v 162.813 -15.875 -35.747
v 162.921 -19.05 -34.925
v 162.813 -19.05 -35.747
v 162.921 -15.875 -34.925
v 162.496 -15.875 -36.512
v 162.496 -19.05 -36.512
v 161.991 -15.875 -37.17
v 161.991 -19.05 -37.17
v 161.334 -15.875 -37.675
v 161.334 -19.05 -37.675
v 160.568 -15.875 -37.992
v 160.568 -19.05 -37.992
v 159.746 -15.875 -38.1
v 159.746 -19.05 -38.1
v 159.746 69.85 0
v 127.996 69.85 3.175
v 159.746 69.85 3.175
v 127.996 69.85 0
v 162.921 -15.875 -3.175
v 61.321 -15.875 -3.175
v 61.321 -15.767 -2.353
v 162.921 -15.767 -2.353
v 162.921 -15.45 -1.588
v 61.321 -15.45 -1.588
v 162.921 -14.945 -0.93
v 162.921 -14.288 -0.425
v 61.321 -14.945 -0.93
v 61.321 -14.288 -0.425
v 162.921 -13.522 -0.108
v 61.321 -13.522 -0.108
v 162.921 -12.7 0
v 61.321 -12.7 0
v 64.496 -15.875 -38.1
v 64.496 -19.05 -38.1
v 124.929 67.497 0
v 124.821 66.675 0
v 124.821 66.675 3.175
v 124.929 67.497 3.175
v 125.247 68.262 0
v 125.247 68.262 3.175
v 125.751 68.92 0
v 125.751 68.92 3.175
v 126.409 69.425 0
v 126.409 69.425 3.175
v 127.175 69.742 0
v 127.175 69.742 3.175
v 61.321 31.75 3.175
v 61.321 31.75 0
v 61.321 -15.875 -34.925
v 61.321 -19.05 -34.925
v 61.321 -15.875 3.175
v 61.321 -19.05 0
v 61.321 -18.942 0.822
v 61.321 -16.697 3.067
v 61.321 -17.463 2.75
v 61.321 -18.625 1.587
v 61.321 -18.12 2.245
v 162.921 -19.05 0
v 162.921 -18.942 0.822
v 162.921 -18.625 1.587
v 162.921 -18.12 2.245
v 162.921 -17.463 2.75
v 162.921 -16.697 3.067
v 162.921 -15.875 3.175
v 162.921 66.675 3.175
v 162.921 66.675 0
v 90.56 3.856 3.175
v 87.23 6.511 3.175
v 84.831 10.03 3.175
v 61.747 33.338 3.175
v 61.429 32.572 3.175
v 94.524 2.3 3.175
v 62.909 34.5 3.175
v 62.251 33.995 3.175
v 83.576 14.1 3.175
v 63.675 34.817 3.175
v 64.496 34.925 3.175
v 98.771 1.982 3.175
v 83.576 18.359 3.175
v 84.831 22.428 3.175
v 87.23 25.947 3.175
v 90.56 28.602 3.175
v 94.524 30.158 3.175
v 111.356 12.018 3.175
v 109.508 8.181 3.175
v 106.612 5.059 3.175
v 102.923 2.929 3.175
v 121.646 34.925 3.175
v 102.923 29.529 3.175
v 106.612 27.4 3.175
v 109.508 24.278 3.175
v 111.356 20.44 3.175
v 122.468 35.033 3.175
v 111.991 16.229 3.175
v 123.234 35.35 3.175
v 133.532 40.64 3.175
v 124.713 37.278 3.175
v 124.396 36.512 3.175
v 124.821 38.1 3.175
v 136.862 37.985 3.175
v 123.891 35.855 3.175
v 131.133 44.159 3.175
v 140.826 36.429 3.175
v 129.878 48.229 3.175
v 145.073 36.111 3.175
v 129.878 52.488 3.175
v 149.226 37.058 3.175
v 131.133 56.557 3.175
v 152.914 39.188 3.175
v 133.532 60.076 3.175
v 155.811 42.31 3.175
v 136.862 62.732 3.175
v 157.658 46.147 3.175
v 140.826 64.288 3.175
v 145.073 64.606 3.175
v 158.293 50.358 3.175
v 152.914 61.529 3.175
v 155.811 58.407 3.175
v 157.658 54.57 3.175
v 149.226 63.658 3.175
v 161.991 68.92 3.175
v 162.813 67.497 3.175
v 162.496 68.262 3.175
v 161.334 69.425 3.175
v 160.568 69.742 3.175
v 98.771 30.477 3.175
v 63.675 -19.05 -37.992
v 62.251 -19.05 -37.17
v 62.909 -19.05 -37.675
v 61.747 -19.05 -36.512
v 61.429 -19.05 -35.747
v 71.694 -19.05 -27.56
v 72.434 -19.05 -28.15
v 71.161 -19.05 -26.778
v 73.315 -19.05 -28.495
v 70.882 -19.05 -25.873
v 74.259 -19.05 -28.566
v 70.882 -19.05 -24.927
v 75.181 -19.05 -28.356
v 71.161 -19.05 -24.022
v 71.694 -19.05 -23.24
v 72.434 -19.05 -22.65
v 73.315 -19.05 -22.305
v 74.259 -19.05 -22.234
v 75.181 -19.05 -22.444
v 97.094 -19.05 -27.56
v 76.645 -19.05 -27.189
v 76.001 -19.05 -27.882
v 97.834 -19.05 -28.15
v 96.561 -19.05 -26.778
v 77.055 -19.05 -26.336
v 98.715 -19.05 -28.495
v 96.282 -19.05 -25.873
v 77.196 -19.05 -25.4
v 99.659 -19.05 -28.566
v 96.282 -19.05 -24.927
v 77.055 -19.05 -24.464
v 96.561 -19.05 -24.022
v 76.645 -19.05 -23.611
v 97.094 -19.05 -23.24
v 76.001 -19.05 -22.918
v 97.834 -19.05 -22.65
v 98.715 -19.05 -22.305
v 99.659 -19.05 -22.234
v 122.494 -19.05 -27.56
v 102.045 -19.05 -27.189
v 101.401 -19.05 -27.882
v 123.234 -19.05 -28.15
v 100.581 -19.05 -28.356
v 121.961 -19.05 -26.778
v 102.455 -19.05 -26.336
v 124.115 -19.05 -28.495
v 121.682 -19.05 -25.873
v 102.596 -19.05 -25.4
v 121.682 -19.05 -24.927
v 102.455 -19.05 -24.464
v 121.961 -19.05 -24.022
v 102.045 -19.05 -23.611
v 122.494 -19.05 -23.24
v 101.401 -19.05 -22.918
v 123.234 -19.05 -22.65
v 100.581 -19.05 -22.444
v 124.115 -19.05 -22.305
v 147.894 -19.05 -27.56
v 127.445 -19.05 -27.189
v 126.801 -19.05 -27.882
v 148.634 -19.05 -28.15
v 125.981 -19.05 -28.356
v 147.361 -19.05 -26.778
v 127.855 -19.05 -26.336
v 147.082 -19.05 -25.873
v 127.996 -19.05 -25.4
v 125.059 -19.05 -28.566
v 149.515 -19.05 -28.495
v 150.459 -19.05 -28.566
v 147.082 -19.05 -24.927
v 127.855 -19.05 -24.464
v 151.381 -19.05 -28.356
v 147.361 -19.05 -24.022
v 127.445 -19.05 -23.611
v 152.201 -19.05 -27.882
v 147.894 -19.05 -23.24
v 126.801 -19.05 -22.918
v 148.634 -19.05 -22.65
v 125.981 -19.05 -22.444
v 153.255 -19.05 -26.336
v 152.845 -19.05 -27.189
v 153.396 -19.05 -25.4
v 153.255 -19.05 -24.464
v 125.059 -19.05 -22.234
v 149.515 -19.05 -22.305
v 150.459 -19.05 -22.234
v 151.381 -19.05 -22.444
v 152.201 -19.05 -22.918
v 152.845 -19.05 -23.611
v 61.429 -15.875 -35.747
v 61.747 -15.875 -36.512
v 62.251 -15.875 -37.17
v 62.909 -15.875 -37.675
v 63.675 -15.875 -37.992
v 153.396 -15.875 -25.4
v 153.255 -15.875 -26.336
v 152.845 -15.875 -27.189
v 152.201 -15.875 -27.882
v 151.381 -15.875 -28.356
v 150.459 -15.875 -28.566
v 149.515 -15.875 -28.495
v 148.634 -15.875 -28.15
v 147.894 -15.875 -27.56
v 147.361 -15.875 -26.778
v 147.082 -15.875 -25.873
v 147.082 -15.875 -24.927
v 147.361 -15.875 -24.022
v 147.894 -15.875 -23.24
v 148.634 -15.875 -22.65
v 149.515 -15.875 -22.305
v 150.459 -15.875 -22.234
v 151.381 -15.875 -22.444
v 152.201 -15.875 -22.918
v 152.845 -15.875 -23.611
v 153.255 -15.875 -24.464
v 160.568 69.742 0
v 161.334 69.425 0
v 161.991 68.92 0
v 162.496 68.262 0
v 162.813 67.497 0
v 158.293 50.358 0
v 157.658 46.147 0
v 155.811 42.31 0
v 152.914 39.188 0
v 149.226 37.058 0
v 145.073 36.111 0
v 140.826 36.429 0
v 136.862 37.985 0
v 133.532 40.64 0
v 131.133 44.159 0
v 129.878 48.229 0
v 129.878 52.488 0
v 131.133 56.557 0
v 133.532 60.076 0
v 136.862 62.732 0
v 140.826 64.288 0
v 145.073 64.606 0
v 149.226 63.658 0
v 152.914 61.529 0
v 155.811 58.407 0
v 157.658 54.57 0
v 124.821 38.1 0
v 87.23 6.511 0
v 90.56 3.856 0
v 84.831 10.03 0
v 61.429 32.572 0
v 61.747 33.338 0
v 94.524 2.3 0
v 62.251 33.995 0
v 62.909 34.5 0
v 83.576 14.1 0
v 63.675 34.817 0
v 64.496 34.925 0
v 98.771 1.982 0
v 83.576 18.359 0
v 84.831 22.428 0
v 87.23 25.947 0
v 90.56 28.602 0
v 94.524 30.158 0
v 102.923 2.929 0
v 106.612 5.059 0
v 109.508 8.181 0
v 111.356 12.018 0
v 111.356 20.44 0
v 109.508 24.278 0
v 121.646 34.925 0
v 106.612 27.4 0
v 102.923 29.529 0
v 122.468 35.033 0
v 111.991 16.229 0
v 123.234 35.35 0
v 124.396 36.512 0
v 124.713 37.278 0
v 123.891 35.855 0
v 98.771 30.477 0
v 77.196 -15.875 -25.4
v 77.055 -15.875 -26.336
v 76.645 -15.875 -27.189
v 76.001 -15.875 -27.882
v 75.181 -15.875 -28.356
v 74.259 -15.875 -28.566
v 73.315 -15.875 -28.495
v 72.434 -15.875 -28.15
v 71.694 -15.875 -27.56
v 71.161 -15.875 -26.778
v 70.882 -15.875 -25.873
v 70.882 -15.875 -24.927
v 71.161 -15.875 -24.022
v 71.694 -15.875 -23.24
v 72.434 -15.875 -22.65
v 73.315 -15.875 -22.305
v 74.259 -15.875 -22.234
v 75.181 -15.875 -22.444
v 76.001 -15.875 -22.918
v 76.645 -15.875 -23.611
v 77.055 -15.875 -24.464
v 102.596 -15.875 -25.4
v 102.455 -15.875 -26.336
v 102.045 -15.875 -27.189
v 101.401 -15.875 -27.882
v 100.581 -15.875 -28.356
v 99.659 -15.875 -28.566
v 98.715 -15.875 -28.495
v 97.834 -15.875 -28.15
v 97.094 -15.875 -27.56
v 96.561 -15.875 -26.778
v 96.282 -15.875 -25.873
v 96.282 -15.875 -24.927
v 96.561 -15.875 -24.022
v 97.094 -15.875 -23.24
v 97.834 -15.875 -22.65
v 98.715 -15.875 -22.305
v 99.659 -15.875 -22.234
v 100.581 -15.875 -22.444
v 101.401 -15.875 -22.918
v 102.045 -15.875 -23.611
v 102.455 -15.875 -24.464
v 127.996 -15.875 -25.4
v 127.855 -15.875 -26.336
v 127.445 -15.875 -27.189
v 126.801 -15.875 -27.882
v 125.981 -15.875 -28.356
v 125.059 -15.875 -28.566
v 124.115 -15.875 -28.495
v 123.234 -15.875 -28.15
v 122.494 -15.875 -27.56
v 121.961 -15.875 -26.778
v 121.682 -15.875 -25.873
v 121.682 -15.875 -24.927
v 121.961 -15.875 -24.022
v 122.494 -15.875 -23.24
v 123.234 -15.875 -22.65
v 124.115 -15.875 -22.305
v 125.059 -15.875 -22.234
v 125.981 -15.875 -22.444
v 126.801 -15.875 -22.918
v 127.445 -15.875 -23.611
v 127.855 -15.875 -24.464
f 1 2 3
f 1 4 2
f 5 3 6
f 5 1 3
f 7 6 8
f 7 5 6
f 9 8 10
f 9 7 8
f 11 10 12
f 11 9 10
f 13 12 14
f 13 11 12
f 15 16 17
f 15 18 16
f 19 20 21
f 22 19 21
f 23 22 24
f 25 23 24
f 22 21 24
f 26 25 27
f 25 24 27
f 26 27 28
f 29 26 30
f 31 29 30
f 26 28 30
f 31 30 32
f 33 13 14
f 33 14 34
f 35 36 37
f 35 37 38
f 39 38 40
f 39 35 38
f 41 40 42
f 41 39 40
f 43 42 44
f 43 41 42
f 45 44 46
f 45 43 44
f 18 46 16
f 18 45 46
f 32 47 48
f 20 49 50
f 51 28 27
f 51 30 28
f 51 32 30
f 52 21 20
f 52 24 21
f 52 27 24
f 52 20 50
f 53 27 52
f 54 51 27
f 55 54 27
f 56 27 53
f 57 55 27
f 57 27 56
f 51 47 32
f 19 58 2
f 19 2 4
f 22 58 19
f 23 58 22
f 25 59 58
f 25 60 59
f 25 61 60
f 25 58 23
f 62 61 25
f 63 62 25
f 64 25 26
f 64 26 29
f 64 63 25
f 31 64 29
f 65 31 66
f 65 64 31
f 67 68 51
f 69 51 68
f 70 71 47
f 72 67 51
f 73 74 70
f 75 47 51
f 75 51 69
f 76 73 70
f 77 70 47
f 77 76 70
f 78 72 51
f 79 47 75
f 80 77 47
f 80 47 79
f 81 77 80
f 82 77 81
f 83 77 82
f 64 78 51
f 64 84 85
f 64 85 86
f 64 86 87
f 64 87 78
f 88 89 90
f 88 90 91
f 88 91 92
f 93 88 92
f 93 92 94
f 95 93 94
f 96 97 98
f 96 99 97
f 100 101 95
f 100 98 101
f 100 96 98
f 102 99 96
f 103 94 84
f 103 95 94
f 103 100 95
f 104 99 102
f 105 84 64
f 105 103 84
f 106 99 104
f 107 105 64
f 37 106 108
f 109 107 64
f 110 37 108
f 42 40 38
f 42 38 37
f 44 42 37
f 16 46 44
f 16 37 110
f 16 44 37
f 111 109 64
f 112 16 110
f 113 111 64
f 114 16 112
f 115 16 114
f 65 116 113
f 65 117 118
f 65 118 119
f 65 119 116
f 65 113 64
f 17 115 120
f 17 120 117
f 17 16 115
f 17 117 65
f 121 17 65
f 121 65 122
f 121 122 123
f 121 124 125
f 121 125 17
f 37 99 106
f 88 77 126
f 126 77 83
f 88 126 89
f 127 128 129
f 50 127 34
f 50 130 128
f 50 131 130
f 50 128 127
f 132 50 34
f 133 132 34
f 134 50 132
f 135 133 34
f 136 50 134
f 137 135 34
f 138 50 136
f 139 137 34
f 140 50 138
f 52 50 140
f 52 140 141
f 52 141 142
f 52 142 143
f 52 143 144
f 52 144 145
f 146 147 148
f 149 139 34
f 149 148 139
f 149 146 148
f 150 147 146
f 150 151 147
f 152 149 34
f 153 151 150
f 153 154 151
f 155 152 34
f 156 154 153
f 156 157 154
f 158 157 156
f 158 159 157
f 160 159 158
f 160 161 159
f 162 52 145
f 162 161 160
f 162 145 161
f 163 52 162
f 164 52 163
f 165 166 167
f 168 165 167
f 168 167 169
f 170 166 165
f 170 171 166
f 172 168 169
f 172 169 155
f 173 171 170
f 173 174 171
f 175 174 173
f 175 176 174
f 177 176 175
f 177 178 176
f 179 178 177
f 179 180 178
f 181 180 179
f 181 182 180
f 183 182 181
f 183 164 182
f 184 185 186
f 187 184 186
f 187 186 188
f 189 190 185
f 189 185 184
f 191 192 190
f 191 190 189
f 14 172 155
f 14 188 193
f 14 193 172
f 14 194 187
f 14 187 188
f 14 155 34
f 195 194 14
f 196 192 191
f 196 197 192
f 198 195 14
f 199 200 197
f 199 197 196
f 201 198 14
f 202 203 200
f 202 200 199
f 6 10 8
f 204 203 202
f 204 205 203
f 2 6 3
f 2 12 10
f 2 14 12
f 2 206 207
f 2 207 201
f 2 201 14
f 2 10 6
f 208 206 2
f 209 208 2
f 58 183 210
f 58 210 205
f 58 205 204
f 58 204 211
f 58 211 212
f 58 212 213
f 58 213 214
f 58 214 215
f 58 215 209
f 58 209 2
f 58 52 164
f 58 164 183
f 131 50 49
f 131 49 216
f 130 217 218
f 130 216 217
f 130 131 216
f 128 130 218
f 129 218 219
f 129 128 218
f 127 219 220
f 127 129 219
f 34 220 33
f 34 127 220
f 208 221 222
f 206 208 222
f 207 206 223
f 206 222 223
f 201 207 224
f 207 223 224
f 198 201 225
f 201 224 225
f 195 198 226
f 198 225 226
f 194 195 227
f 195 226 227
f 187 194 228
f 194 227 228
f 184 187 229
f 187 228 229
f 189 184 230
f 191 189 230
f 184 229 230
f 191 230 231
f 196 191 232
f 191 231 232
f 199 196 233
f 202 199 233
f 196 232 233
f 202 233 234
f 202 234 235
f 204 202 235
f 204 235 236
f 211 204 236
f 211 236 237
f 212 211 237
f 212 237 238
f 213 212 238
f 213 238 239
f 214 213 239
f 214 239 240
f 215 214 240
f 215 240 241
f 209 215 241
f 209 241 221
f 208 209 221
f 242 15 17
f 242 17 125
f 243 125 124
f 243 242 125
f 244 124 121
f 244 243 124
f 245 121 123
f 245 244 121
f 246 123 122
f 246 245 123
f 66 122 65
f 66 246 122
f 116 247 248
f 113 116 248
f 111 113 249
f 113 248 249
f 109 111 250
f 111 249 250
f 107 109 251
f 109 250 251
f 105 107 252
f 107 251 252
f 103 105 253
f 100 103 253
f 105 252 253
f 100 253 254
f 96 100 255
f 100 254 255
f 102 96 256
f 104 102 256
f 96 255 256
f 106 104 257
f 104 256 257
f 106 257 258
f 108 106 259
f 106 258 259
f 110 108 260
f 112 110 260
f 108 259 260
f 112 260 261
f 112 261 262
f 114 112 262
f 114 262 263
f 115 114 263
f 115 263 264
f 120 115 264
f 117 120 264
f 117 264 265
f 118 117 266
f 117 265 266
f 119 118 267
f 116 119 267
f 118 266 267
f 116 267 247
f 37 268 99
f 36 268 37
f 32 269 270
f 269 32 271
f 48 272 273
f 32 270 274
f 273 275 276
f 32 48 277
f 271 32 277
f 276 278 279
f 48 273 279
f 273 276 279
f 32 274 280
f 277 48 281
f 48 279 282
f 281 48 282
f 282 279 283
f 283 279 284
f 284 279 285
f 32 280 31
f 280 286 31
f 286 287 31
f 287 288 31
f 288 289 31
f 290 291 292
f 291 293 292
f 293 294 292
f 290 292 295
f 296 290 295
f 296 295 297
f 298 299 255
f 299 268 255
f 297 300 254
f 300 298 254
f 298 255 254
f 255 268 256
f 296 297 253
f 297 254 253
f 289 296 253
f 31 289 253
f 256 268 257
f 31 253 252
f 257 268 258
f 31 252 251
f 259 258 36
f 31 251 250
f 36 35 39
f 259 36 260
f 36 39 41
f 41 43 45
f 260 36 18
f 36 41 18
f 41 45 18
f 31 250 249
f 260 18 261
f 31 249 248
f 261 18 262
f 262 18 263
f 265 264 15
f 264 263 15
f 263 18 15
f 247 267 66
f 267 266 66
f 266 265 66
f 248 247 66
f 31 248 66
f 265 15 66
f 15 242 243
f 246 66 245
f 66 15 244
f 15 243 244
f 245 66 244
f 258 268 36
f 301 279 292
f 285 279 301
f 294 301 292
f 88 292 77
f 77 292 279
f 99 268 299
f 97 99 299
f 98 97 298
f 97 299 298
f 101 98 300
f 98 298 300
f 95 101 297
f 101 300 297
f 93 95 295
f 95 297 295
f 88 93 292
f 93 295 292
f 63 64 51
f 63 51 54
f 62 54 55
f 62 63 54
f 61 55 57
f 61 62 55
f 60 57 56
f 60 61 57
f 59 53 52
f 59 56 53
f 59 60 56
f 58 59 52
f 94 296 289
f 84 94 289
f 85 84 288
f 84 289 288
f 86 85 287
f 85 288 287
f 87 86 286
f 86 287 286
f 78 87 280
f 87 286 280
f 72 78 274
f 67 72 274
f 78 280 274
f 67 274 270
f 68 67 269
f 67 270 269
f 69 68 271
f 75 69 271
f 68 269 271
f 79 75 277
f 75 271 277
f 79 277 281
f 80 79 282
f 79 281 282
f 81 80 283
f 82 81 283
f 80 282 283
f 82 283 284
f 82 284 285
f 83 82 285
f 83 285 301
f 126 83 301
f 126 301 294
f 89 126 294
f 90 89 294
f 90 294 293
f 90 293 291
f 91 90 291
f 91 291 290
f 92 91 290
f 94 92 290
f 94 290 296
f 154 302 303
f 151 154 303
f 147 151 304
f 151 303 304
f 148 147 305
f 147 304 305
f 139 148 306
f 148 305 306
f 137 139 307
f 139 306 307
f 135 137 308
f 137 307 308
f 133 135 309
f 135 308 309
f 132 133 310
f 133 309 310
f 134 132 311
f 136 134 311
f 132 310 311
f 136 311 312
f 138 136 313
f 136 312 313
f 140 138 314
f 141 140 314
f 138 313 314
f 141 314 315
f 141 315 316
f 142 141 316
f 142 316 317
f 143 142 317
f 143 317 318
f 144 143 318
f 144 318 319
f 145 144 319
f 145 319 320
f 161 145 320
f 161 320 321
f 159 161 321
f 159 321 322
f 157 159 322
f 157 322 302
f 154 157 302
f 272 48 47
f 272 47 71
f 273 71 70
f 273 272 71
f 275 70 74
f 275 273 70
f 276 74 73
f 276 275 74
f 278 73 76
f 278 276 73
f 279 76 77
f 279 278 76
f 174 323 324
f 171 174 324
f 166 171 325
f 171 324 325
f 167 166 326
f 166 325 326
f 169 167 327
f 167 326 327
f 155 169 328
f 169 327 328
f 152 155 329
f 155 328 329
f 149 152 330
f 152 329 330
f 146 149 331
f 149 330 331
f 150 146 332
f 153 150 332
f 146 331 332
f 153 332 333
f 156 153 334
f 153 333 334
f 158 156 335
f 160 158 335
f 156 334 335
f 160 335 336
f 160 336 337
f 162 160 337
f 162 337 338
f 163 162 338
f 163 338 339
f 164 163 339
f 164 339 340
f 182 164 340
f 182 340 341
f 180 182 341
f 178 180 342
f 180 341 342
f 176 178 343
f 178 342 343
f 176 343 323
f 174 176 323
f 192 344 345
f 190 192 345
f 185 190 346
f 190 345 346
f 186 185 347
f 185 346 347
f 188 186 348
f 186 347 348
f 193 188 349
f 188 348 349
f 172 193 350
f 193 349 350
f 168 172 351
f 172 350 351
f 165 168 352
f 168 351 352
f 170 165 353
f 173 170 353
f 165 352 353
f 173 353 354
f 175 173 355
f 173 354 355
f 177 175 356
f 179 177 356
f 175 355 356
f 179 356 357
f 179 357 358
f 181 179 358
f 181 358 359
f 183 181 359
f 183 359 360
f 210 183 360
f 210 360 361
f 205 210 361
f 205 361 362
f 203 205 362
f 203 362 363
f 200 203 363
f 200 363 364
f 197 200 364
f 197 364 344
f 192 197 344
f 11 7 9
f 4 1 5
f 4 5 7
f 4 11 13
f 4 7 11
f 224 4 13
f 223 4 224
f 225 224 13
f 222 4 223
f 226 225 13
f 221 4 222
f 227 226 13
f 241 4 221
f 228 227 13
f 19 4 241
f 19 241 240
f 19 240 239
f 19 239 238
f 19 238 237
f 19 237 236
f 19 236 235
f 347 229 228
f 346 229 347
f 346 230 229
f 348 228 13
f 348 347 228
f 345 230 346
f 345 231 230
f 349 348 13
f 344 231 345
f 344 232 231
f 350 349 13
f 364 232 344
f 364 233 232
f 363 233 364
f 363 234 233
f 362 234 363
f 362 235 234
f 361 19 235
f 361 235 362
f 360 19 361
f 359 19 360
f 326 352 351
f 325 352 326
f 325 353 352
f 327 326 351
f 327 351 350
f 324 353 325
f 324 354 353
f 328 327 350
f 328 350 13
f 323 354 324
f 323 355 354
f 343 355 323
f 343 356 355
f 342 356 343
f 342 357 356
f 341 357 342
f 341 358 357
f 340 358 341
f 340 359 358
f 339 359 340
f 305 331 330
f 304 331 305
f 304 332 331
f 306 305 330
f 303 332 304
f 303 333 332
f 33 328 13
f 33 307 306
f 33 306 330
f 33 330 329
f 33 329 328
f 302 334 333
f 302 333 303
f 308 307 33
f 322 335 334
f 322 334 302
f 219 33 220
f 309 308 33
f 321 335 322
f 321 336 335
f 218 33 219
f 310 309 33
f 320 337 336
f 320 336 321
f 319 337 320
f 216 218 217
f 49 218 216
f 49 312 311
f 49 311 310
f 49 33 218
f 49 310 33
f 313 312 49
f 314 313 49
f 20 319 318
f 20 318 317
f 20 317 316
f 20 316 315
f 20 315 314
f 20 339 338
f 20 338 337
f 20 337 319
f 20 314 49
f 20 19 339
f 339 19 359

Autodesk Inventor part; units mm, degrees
ref_plane "YZ Plane" through (0, 0, 0) normal (1, 0, 0) x (0, 1, 0)
ref_plane "XZ Plane" through (0, 0, 0) normal (0, 1, 0) x (-1, 0, 0)
ref_plane "XY Plane" through (0, 0, 0) normal (0, 0, 1) x (1, 0, 0)
sketch "Sketch1" plane through (0, 0, 0) normal (0, 0, 1) x (1, 0, 0)
  line L0 (762, 0) -> (762, -101.6)
  line L1 (762, -101.6) -> (0, -101.6)
  line L2 (0, -101.6) -> (0, 0)
  line L3 (194.457, 486.6085) -> (233.372, 453.9549)
  line L4 (233.372, 453.9549) -> (102.7576, 298.2946)
  line L5 (102.7576, 298.2946) -> (63.8425, 330.9483)
  line L6 (63.8425, 330.9483) -> (194.457, 486.6085)
  line L7 (-316.8542, 110.7002) -> (-152.9915, 230.8635)
  line L8 (-152.9915, 230.8635) -> (-122.9506, 189.8979)
  line L9 (-122.9506, 189.8979) -> (-286.8134, 69.7345)
  line L10 (-286.8134, 69.7345) -> (-316.8542, 110.7002)
  circle A0 centre (97.7035, 16.2291) radius 358.4366 construction
  line L11 (-240.3853, 135.2786) -> (97.7035, 16.2291) construction
  line L12 (97.7035, 16.2291) -> (132.2805, 372.994) construction
  circle A1 centre (144.0057, 50.3583) radius 362.156 construction
  line L13 (144.0057, 50.3583) -> (164.9341, 411.9091) construction
  line L14 (144.0057, 50.3583) -> (-199.4196, 165.3194) construction
  circle A2 centre (-240.3853, 135.2786) radius 12.7
  circle A3 centre (-199.4196, 165.3194) radius 12.7
  circle A4 centre (132.2805, 372.994) radius 12.7
  circle A5 centre (164.9341, 411.9091) radius 12.7
  circle A6 centre (97.7035, 16.2291) radius 12.7
  circle A7 centre (144.0057, 50.3583) radius 12.7
  line L15 (-199.4196, 165.3194) -> (144.0057, 50.3583) construction
  arc A8 (-215.4061, 202.6622) -> (-230.8062, 191.1057) centre (-199.4196, 165.3194) ccw
  arc A9 (131.5057, 48.1134) -> (132.3942, 55.5025) centre (144.0057, 50.3583) ccw
  line L16 (-240.3853, 135.2786) -> (97.7035, 16.2291) construction
  line L17 (-244.6034, 123.2995) -> (93.4854, 4.2501)
  line L18 (101.9216, 28.2081) -> (-236.1671, 147.2576)
  arc A10 (-236.1671, 147.2576) -> (-244.6034, 123.2995) centre (-240.3853, 135.2786) ccw
  arc A11 (93.4854, 4.2501) -> (101.9216, 28.2081) centre (97.7035, 16.2291) ccw
  line L19 (164.9341, 411.9091) -> (144.0057, 50.3583) construction
  line L20 (152.2553, 412.643) -> (131.3269, 51.0922)
  line L21 (156.6845, 49.6244) -> (177.6129, 411.1752)
  arc A12 (177.6129, 411.1752) -> (152.2553, 412.643) centre (164.9341, 411.9091) ccw
  arc A13 (131.3269, 51.0922) -> (156.6845, 49.6244) centre (144.0057, 50.3583) ccw
  line L22 (132.2805, 372.994) -> (97.7035, 16.2291) construction
  line L23 (119.6397, 374.2192) -> (85.0627, 17.4542)
  line L24 (110.3443, 15.004) -> (144.9213, 371.7689)
  arc A14 (144.9213, 371.7689) -> (119.6397, 374.2192) centre (132.2805, 372.994) ccw
  arc A15 (85.0627, 17.4542) -> (110.3443, 15.004) centre (97.7035, 16.2291) ccw
  line L25 (144.0057, 50.3583) -> (-199.4196, 165.3194) construction
  line L26 (148.0371, 62.4015) -> (-195.3881, 177.3626)
  line L27 (-203.451, 153.2763) -> (139.9743, 38.3151)
  arc A16 (139.9743, 38.3151) -> (148.0371, 62.4015) centre (144.0057, 50.3583) ccw
  arc A17 (-195.3881, 177.3626) -> (-203.451, 153.2763) centre (-199.4196, 165.3194) ccw
  line L28 (162.9213, 0) -> (162.9213, 31.75)
  line L29 (61.3213, 28.575) -> (61.3213, 0)
  line L30 (162.9213, 31.75) -> (124.8213, 31.75)
  line L31 (124.8213, 38.1) -> (124.8213, 66.675)
  line L32 (127.9963, 69.85) -> (159.7463, 69.85)
  line L33 (162.9213, 66.675) -> (162.9213, 31.75)
  arc A18 (162.9213, 66.675) -> (159.7463, 69.85) centre (159.7463, 66.675) ccw
  arc A19 (127.9963, 69.85) -> (124.8213, 66.675) centre (127.9963, 66.675) ccw
  circle A20 centre (144.0057, 50.3583) radius 14.2875
  circle A21 centre (97.7035, 16.2291) radius 14.2875
  line L34 (61.3213, 0) -> (61.3213, -6.35)
  line L35 (61.3213, -6.35) -> (162.9213, -6.35)
  line L36 (162.9213, -6.35) -> (162.9213, 0)
  line L37 (124.8213, 34.925) -> (121.541, 34.925)
  line L38 (121.6463, 34.925) -> (64.4963, 34.925)
  line L39 (61.3213, 31.75) -> (61.3213, 28.575)
  arc A22 (64.4963, 34.925) -> (61.3213, 31.75) centre (64.4963, 31.75) ccw
  arc A23 (121.6463, 34.925) -> (124.8213, 38.1) centre (121.6463, 38.1) ccw
  line L40 (61.3213, -6.35) -> (61.3213, -19.05)
  line L41 (61.3213, -19.05) -> (162.9213, -19.05)
  line L42 (162.9213, -19.05) -> (162.9213, -6.35)
  line L43 (61.3213, -15.875) -> (162.9213, -15.875)
  point P0 (213.9145, 470.2817)
  point P1 (83.3001, 314.6214)
  point P2 (-301.8338, 90.2173)
  point P3 (-27.7069, 107.8389)
  point P4 (-71.3409, 75.7538)
  point P5 (154.4699, 231.1337)
  point P6 (114.992, 194.6116)
  point P7 (-27.7069, 107.8389)
  point P8 (124.8213, 69.85)
  point P9 (162.9213, 69.85)
  point P10 (132.4127, 69.85)
  point P11 (132.2867, 67.6739)
  point P12 (141.8302, 64.4792)
  point P13 (131.7052, 57.6267)
  point P14 (126.6629, 69.5564)
  point P15 (61.3213, 34.925)
  point P16 (124.8213, 43.3876)
  point P17 (157.8552, 69.85)
  point P18 (157.0627, 56.1589)
  point P19 (133.7674, 40.3929)
  point P20 (86.6269, 33.5938)
  point P21 (82.8464, 34.925)
  point P22 (86.756, 34.925)
  dimension "d0" = 762
  dimension "d1" = 101.6
  dimension "d2" = 50.8
  dimension "d3" = 203.2
  dimension "d6" = 203.2
  dimension "d7" = 50.8
  dimension "d12" = 25.4
  dimension "d13" = 25.4
  dimension "d14" = 25.4
  dimension "d15" = 25.4
  dimension "d16" = 25.4
  dimension "d17" = 25.4
  dimension "d18" = 25.4
  dimension "d19" = 25.4
  dimension "d20" = 76.2
  dimension "d21" = 76.2
  dimension "d22" = 76.2
  dimension "d23" = 76.2
  dimension "d24" = 25.4
  dimension "d25" = 25.4
  dimension "d26" = 25.4
  dimension "d27" = 25.4
  dimension "d28" = 25.4
  dimension "d29" = 25.4
  dimension "d30" = 25.4
  dimension "d32" = 31.75
  dimension "d33" = 38.1
  dimension "d34" = 38.1
  dimension "d35" = 3.175
  dimension "d43" = 28.575
  dimension "d44" = 28.575
  dimension "d45" = 6.35
  dimension "d47" = 3.175
  dimension "d65" = 12.7
  dimension "d66" = 3.175
extrude "Extrusion1" add sketch "Sketch1" along normal blind 3.175 contours L32 A18 L33 L28 L36 L35 L34 L29 L17 A21 L24 L38 L37 A23 L31 L27 A20 L21 | L21 A20 L26 L20 L32 | L20 L26 A19 L32 | L26 A20 L20 | L20 A20 L27 L31 A19 L26 | L38 L24 A21 L18 L23 | L23 L18 L38 | L23 A21 L17 L29 L39 A22 L38 L18 | L18 A21 L23 | L42 L43 L40 L35 | L42 L41 L40 L43
sketch "Sketch7" plane through (0, 0, 0) normal (0, 0, -1) x (-1, 0, 0)
  line L0 (-162.9213, -19.05) -> (-162.9213, 66.675) projected
  line L1 (-61.3213, -19.05) -> (-162.9213, -19.05) projected
  line L2 (-61.3213, 31.75) -> (-61.3213, -19.05) projected
  line L3 (-162.9213, -15.875) -> (-61.3213, -15.875)
  point P0 (0, 0)
  dimension "d82" = 3.175
extrude "Extrusion7" add sketch "Sketch7" along normal blind 38.1
fillet "Fillet3" radius 3.175 4 edges at (61.3213, -17.4625, -38.1) (162.9213, -17.4625, -38.1) (112.1213, -15.875, 0) (112.1213, -19.05, 3.175)
sketch "Sketch8" plane through (61.3213, -15.875, -3.175) normal (0, 1, 0) x (1, 0, 0)
  line L0 (101.6, 0) -> (101.6, 31.75) projected
  arc A0 (101.6, 31.75) -> (98.425, 34.925) centre (98.425, 31.75) ccw projected
  line L1 (3.175, 34.925) -> (98.425, 34.925) projected
  line L2 (0, 0) -> (0, 31.75) projected
  arc A1 (3.175, 34.925) -> (0, 31.75) centre (3.175, 31.75) ccw projected
  line L3 (101.6, 22.225) -> (0, 22.225)
  line L4 (0, 31.75) -> (0, -3.175) projected
  circle A2 centre (88.9, 22.225) radius 3.175
  circle A3 centre (63.5, 22.225) radius 3.175
  circle A4 centre (38.1, 22.225) radius 3.175
  circle A5 centre (12.7, 22.225) radius 3.175
  point P0 (-61.3213, -3.175)
  dimension "d86" = 12.7
  dimension "d87" = 6.35
  dimension "d88" = 6.35
  dimension "d89" = 6.35
  dimension "d90" = 6.35
  dimension "d91" = 12.7
  dimension "d92" = 25.4
  dimension "d93" = 25.4
  dimension "d94" = 25.4
extrude "Extrusion8" cut sketch "Sketch8" against normal blind 38.1 contours A2 L3 | L3 A2 | A3 L3 | L3 A3 | A4 L3 | L3 A4 | A5 L3 | L3 A5
properties part number "4-bar intake mount(alt)"
